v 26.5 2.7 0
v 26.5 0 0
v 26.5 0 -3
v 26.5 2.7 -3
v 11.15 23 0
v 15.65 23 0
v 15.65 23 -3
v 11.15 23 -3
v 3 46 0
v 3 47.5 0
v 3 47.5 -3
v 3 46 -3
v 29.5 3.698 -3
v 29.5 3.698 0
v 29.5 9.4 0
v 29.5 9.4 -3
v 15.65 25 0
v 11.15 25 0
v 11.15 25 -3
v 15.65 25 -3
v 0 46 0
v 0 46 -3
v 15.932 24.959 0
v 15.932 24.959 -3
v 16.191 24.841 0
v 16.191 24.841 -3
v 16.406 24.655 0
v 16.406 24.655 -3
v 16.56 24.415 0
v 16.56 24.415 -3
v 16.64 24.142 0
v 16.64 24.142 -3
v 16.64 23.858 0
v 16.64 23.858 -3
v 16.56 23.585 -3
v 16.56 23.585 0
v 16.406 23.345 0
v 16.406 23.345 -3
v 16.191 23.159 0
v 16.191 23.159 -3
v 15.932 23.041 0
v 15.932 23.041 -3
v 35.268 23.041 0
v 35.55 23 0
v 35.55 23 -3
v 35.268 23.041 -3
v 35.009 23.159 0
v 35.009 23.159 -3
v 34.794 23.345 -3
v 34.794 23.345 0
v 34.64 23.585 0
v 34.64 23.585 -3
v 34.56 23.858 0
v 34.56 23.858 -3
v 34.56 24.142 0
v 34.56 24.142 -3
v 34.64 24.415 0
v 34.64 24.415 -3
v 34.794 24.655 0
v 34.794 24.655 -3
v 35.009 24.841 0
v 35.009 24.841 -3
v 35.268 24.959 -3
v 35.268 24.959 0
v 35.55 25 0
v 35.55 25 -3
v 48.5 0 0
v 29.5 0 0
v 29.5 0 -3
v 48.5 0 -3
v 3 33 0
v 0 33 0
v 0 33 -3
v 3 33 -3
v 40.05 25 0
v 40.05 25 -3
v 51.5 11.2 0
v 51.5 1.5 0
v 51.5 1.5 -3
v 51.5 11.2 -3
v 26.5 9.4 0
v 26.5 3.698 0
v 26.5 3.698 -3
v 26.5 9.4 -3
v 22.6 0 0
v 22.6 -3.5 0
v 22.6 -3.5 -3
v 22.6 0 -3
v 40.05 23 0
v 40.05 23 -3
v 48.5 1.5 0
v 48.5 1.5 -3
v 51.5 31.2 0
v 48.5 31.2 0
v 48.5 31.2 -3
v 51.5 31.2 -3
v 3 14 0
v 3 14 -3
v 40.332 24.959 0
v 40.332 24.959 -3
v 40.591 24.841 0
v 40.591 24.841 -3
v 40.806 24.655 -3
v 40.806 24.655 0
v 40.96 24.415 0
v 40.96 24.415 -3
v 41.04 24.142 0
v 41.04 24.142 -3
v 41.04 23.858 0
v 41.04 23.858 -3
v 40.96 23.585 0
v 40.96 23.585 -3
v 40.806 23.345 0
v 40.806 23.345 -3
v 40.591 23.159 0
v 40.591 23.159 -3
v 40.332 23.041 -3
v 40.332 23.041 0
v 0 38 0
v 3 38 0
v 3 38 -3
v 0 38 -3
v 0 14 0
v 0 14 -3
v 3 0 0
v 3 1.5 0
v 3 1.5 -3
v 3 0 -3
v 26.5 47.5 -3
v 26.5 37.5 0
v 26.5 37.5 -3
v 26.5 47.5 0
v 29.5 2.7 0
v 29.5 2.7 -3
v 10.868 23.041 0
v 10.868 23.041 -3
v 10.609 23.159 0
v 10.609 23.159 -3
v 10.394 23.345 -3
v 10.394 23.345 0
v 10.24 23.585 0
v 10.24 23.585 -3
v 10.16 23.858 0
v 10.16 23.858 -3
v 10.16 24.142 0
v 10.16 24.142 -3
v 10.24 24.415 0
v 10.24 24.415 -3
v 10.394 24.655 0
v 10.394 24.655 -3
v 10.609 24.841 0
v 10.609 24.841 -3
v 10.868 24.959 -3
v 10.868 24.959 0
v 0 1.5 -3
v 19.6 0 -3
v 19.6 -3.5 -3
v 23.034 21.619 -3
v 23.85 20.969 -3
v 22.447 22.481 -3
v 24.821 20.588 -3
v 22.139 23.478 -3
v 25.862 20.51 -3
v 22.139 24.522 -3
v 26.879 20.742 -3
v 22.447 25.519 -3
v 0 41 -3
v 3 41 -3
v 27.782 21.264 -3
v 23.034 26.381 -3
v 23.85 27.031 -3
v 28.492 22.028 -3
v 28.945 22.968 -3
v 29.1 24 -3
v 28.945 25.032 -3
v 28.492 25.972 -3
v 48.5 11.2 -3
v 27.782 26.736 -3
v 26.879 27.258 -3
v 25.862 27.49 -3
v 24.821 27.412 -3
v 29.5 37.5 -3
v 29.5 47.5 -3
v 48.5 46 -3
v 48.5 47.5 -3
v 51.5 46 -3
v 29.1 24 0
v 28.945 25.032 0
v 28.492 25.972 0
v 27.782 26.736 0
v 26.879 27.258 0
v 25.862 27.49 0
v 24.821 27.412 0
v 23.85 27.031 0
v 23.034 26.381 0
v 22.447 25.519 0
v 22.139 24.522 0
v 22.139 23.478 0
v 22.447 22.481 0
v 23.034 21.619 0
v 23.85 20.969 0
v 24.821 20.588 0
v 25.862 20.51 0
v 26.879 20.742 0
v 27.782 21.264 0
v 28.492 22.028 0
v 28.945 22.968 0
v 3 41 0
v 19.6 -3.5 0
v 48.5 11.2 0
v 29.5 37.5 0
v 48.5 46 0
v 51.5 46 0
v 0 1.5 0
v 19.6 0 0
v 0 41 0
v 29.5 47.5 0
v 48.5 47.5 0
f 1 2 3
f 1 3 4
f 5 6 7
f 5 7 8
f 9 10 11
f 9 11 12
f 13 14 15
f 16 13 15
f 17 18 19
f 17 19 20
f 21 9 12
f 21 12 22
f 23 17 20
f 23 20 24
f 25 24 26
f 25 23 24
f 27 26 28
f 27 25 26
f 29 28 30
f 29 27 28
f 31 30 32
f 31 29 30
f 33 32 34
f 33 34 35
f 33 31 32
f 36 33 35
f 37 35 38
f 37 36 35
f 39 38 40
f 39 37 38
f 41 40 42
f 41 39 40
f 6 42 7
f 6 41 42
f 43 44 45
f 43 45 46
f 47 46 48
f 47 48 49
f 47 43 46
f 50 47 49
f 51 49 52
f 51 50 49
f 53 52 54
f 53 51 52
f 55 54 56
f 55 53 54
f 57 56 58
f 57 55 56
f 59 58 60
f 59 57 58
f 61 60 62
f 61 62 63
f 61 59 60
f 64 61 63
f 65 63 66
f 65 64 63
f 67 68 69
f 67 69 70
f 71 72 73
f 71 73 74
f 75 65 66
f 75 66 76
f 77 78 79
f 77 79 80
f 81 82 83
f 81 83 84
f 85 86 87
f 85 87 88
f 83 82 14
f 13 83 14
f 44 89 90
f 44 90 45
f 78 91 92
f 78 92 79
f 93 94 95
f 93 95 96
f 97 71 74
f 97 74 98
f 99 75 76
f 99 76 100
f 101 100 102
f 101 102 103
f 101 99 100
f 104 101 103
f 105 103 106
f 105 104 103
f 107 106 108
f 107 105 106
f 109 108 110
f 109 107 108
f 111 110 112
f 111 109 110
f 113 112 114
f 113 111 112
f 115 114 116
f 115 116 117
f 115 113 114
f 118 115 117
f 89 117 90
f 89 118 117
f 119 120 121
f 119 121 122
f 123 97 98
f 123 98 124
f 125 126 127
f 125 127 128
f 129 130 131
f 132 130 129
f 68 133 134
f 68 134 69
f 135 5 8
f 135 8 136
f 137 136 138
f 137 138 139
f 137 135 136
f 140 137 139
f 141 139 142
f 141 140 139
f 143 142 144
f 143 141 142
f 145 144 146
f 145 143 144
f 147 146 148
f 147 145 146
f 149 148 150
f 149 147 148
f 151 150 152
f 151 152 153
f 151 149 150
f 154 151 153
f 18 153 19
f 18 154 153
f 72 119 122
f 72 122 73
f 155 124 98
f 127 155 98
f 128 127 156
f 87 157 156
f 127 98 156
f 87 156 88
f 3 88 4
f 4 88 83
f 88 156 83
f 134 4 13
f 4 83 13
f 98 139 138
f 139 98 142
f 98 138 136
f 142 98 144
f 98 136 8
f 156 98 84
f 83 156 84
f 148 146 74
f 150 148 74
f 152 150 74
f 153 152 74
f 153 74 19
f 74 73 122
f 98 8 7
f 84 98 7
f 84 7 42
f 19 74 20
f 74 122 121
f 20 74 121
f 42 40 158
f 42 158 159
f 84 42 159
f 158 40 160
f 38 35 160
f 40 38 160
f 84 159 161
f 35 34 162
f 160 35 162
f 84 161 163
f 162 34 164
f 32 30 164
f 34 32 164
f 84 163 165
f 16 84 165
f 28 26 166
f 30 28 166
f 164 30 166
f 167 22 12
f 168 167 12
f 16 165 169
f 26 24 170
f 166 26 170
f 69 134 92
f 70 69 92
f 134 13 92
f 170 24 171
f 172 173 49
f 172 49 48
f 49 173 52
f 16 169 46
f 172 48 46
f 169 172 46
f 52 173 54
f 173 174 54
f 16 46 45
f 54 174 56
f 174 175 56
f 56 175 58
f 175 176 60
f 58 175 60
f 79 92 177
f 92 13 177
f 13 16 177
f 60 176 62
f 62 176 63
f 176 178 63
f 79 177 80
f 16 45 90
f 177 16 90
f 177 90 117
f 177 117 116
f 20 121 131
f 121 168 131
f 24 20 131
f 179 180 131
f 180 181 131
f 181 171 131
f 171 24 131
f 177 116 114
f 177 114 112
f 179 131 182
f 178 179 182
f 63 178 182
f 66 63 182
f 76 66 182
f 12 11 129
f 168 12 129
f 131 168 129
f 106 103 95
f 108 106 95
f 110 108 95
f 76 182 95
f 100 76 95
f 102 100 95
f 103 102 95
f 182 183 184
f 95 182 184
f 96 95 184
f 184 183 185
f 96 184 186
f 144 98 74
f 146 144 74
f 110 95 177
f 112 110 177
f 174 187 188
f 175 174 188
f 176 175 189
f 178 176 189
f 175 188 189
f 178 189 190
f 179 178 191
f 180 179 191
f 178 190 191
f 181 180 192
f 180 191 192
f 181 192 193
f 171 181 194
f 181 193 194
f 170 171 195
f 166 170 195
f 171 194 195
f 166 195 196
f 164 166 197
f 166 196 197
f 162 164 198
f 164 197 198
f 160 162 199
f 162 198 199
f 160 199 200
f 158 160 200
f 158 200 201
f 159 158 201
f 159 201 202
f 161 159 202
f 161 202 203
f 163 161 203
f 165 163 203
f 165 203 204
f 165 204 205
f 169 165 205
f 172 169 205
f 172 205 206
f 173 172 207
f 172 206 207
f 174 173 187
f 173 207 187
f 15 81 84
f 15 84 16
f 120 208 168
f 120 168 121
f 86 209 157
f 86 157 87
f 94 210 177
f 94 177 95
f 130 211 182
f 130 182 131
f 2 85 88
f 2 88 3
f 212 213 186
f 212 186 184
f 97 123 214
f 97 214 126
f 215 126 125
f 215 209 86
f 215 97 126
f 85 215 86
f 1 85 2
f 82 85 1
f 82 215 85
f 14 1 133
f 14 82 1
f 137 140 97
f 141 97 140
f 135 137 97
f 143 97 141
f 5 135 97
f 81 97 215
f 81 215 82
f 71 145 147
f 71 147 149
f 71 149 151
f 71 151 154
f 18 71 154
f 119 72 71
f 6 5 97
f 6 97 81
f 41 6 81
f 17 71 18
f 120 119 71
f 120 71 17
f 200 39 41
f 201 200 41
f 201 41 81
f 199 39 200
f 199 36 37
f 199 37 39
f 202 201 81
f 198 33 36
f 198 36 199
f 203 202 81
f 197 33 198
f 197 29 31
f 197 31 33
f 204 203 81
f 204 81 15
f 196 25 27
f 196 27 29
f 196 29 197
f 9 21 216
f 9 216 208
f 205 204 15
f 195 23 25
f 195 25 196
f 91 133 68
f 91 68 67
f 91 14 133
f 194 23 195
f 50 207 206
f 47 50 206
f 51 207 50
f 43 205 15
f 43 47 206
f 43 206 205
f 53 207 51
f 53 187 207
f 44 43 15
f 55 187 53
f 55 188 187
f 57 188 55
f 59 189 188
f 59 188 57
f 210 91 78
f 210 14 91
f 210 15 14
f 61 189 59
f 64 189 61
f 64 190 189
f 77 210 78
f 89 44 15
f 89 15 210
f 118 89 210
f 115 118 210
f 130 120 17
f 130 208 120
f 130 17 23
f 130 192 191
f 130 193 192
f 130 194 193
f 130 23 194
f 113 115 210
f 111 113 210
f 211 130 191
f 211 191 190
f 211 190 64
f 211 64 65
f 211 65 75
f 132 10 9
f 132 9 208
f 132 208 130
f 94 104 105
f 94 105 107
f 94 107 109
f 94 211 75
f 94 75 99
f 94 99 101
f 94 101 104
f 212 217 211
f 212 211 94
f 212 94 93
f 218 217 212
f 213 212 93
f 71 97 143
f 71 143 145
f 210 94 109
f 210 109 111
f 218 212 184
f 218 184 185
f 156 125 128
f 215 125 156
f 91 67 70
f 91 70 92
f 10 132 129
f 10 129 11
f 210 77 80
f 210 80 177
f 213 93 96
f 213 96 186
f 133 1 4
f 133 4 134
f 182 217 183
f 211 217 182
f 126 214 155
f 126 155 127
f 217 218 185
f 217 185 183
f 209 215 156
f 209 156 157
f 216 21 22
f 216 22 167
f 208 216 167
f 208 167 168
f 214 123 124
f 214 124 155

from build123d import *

# Parameters (mm, degrees)
ESQUISSE1_R               = 3.5
ESQUISSE1_W               = 3
ESQUISSE1_H               = 5.702159315
T_LE_DE_BASE_PLI_E1_DEPTH = 3


# Sheet-metal steps are written as plain solids
with BuildPart() as part:
    # Esquisse1 → Tôle de base pliée1 (new body)
    with BuildSketch(Plane.XY):
        Polygon((29.5, 47.5), (29.5, 37.5), (26.5, 37.5), (26.5, 47.5), (3, 47.5), (3, 46), (0, 46), (0, 41), (3, 41), (3, 38), (0, 38), (0, 33), (3, 33), (3, 14), (0, 14), (0, 1.5), (3, 1.5), (3, 0), (19.6, 0), (19.6, -3.5), (22.6, -3.5), (22.6, 0), (26.5, 0), (26.5, 2.7), (29.5, 2.7), (29.5, 0), (48.5, 0), (48.5, 1.5), (51.5, 1.5), (51.5, 11.2), (48.5, 11.2), (48.5, 31.2), (51.5, 31.2), (51.5, 46), (48.5, 46), (48.5, 47.5), align=None)
        with Locations((25.6, 24)):
            Circle(ESQUISSE1_R, mode=Mode.SUBTRACT)
        with BuildLine():
            Line((35.55, 25), (40.05, 25))
            ThreePointArc((40.05, 25), (41.05, 24), (40.05, 23))
            Line((40.05, 23), (35.55, 23))
            ThreePointArc((35.55, 23), (34.55, 24), (35.55, 25))
        make_face(mode=Mode.SUBTRACT)
        with BuildLine():
            Line((11.15, 25), (15.65, 25))
            ThreePointArc((15.65, 25), (16.65, 24), (15.65, 23))
            Line((15.65, 23), (11.15, 23))
            ThreePointArc((11.15, 23), (10.15, 24), (11.15, 25))
        make_face(mode=Mode.SUBTRACT)
        with Locations((28, 6.548920343)):
            Rectangle(ESQUISSE1_W, ESQUISSE1_H, mode=Mode.SUBTRACT)
    extrude(amount=-T_LE_DE_BASE_PLI_E1_DEPTH)


solid = part.part
